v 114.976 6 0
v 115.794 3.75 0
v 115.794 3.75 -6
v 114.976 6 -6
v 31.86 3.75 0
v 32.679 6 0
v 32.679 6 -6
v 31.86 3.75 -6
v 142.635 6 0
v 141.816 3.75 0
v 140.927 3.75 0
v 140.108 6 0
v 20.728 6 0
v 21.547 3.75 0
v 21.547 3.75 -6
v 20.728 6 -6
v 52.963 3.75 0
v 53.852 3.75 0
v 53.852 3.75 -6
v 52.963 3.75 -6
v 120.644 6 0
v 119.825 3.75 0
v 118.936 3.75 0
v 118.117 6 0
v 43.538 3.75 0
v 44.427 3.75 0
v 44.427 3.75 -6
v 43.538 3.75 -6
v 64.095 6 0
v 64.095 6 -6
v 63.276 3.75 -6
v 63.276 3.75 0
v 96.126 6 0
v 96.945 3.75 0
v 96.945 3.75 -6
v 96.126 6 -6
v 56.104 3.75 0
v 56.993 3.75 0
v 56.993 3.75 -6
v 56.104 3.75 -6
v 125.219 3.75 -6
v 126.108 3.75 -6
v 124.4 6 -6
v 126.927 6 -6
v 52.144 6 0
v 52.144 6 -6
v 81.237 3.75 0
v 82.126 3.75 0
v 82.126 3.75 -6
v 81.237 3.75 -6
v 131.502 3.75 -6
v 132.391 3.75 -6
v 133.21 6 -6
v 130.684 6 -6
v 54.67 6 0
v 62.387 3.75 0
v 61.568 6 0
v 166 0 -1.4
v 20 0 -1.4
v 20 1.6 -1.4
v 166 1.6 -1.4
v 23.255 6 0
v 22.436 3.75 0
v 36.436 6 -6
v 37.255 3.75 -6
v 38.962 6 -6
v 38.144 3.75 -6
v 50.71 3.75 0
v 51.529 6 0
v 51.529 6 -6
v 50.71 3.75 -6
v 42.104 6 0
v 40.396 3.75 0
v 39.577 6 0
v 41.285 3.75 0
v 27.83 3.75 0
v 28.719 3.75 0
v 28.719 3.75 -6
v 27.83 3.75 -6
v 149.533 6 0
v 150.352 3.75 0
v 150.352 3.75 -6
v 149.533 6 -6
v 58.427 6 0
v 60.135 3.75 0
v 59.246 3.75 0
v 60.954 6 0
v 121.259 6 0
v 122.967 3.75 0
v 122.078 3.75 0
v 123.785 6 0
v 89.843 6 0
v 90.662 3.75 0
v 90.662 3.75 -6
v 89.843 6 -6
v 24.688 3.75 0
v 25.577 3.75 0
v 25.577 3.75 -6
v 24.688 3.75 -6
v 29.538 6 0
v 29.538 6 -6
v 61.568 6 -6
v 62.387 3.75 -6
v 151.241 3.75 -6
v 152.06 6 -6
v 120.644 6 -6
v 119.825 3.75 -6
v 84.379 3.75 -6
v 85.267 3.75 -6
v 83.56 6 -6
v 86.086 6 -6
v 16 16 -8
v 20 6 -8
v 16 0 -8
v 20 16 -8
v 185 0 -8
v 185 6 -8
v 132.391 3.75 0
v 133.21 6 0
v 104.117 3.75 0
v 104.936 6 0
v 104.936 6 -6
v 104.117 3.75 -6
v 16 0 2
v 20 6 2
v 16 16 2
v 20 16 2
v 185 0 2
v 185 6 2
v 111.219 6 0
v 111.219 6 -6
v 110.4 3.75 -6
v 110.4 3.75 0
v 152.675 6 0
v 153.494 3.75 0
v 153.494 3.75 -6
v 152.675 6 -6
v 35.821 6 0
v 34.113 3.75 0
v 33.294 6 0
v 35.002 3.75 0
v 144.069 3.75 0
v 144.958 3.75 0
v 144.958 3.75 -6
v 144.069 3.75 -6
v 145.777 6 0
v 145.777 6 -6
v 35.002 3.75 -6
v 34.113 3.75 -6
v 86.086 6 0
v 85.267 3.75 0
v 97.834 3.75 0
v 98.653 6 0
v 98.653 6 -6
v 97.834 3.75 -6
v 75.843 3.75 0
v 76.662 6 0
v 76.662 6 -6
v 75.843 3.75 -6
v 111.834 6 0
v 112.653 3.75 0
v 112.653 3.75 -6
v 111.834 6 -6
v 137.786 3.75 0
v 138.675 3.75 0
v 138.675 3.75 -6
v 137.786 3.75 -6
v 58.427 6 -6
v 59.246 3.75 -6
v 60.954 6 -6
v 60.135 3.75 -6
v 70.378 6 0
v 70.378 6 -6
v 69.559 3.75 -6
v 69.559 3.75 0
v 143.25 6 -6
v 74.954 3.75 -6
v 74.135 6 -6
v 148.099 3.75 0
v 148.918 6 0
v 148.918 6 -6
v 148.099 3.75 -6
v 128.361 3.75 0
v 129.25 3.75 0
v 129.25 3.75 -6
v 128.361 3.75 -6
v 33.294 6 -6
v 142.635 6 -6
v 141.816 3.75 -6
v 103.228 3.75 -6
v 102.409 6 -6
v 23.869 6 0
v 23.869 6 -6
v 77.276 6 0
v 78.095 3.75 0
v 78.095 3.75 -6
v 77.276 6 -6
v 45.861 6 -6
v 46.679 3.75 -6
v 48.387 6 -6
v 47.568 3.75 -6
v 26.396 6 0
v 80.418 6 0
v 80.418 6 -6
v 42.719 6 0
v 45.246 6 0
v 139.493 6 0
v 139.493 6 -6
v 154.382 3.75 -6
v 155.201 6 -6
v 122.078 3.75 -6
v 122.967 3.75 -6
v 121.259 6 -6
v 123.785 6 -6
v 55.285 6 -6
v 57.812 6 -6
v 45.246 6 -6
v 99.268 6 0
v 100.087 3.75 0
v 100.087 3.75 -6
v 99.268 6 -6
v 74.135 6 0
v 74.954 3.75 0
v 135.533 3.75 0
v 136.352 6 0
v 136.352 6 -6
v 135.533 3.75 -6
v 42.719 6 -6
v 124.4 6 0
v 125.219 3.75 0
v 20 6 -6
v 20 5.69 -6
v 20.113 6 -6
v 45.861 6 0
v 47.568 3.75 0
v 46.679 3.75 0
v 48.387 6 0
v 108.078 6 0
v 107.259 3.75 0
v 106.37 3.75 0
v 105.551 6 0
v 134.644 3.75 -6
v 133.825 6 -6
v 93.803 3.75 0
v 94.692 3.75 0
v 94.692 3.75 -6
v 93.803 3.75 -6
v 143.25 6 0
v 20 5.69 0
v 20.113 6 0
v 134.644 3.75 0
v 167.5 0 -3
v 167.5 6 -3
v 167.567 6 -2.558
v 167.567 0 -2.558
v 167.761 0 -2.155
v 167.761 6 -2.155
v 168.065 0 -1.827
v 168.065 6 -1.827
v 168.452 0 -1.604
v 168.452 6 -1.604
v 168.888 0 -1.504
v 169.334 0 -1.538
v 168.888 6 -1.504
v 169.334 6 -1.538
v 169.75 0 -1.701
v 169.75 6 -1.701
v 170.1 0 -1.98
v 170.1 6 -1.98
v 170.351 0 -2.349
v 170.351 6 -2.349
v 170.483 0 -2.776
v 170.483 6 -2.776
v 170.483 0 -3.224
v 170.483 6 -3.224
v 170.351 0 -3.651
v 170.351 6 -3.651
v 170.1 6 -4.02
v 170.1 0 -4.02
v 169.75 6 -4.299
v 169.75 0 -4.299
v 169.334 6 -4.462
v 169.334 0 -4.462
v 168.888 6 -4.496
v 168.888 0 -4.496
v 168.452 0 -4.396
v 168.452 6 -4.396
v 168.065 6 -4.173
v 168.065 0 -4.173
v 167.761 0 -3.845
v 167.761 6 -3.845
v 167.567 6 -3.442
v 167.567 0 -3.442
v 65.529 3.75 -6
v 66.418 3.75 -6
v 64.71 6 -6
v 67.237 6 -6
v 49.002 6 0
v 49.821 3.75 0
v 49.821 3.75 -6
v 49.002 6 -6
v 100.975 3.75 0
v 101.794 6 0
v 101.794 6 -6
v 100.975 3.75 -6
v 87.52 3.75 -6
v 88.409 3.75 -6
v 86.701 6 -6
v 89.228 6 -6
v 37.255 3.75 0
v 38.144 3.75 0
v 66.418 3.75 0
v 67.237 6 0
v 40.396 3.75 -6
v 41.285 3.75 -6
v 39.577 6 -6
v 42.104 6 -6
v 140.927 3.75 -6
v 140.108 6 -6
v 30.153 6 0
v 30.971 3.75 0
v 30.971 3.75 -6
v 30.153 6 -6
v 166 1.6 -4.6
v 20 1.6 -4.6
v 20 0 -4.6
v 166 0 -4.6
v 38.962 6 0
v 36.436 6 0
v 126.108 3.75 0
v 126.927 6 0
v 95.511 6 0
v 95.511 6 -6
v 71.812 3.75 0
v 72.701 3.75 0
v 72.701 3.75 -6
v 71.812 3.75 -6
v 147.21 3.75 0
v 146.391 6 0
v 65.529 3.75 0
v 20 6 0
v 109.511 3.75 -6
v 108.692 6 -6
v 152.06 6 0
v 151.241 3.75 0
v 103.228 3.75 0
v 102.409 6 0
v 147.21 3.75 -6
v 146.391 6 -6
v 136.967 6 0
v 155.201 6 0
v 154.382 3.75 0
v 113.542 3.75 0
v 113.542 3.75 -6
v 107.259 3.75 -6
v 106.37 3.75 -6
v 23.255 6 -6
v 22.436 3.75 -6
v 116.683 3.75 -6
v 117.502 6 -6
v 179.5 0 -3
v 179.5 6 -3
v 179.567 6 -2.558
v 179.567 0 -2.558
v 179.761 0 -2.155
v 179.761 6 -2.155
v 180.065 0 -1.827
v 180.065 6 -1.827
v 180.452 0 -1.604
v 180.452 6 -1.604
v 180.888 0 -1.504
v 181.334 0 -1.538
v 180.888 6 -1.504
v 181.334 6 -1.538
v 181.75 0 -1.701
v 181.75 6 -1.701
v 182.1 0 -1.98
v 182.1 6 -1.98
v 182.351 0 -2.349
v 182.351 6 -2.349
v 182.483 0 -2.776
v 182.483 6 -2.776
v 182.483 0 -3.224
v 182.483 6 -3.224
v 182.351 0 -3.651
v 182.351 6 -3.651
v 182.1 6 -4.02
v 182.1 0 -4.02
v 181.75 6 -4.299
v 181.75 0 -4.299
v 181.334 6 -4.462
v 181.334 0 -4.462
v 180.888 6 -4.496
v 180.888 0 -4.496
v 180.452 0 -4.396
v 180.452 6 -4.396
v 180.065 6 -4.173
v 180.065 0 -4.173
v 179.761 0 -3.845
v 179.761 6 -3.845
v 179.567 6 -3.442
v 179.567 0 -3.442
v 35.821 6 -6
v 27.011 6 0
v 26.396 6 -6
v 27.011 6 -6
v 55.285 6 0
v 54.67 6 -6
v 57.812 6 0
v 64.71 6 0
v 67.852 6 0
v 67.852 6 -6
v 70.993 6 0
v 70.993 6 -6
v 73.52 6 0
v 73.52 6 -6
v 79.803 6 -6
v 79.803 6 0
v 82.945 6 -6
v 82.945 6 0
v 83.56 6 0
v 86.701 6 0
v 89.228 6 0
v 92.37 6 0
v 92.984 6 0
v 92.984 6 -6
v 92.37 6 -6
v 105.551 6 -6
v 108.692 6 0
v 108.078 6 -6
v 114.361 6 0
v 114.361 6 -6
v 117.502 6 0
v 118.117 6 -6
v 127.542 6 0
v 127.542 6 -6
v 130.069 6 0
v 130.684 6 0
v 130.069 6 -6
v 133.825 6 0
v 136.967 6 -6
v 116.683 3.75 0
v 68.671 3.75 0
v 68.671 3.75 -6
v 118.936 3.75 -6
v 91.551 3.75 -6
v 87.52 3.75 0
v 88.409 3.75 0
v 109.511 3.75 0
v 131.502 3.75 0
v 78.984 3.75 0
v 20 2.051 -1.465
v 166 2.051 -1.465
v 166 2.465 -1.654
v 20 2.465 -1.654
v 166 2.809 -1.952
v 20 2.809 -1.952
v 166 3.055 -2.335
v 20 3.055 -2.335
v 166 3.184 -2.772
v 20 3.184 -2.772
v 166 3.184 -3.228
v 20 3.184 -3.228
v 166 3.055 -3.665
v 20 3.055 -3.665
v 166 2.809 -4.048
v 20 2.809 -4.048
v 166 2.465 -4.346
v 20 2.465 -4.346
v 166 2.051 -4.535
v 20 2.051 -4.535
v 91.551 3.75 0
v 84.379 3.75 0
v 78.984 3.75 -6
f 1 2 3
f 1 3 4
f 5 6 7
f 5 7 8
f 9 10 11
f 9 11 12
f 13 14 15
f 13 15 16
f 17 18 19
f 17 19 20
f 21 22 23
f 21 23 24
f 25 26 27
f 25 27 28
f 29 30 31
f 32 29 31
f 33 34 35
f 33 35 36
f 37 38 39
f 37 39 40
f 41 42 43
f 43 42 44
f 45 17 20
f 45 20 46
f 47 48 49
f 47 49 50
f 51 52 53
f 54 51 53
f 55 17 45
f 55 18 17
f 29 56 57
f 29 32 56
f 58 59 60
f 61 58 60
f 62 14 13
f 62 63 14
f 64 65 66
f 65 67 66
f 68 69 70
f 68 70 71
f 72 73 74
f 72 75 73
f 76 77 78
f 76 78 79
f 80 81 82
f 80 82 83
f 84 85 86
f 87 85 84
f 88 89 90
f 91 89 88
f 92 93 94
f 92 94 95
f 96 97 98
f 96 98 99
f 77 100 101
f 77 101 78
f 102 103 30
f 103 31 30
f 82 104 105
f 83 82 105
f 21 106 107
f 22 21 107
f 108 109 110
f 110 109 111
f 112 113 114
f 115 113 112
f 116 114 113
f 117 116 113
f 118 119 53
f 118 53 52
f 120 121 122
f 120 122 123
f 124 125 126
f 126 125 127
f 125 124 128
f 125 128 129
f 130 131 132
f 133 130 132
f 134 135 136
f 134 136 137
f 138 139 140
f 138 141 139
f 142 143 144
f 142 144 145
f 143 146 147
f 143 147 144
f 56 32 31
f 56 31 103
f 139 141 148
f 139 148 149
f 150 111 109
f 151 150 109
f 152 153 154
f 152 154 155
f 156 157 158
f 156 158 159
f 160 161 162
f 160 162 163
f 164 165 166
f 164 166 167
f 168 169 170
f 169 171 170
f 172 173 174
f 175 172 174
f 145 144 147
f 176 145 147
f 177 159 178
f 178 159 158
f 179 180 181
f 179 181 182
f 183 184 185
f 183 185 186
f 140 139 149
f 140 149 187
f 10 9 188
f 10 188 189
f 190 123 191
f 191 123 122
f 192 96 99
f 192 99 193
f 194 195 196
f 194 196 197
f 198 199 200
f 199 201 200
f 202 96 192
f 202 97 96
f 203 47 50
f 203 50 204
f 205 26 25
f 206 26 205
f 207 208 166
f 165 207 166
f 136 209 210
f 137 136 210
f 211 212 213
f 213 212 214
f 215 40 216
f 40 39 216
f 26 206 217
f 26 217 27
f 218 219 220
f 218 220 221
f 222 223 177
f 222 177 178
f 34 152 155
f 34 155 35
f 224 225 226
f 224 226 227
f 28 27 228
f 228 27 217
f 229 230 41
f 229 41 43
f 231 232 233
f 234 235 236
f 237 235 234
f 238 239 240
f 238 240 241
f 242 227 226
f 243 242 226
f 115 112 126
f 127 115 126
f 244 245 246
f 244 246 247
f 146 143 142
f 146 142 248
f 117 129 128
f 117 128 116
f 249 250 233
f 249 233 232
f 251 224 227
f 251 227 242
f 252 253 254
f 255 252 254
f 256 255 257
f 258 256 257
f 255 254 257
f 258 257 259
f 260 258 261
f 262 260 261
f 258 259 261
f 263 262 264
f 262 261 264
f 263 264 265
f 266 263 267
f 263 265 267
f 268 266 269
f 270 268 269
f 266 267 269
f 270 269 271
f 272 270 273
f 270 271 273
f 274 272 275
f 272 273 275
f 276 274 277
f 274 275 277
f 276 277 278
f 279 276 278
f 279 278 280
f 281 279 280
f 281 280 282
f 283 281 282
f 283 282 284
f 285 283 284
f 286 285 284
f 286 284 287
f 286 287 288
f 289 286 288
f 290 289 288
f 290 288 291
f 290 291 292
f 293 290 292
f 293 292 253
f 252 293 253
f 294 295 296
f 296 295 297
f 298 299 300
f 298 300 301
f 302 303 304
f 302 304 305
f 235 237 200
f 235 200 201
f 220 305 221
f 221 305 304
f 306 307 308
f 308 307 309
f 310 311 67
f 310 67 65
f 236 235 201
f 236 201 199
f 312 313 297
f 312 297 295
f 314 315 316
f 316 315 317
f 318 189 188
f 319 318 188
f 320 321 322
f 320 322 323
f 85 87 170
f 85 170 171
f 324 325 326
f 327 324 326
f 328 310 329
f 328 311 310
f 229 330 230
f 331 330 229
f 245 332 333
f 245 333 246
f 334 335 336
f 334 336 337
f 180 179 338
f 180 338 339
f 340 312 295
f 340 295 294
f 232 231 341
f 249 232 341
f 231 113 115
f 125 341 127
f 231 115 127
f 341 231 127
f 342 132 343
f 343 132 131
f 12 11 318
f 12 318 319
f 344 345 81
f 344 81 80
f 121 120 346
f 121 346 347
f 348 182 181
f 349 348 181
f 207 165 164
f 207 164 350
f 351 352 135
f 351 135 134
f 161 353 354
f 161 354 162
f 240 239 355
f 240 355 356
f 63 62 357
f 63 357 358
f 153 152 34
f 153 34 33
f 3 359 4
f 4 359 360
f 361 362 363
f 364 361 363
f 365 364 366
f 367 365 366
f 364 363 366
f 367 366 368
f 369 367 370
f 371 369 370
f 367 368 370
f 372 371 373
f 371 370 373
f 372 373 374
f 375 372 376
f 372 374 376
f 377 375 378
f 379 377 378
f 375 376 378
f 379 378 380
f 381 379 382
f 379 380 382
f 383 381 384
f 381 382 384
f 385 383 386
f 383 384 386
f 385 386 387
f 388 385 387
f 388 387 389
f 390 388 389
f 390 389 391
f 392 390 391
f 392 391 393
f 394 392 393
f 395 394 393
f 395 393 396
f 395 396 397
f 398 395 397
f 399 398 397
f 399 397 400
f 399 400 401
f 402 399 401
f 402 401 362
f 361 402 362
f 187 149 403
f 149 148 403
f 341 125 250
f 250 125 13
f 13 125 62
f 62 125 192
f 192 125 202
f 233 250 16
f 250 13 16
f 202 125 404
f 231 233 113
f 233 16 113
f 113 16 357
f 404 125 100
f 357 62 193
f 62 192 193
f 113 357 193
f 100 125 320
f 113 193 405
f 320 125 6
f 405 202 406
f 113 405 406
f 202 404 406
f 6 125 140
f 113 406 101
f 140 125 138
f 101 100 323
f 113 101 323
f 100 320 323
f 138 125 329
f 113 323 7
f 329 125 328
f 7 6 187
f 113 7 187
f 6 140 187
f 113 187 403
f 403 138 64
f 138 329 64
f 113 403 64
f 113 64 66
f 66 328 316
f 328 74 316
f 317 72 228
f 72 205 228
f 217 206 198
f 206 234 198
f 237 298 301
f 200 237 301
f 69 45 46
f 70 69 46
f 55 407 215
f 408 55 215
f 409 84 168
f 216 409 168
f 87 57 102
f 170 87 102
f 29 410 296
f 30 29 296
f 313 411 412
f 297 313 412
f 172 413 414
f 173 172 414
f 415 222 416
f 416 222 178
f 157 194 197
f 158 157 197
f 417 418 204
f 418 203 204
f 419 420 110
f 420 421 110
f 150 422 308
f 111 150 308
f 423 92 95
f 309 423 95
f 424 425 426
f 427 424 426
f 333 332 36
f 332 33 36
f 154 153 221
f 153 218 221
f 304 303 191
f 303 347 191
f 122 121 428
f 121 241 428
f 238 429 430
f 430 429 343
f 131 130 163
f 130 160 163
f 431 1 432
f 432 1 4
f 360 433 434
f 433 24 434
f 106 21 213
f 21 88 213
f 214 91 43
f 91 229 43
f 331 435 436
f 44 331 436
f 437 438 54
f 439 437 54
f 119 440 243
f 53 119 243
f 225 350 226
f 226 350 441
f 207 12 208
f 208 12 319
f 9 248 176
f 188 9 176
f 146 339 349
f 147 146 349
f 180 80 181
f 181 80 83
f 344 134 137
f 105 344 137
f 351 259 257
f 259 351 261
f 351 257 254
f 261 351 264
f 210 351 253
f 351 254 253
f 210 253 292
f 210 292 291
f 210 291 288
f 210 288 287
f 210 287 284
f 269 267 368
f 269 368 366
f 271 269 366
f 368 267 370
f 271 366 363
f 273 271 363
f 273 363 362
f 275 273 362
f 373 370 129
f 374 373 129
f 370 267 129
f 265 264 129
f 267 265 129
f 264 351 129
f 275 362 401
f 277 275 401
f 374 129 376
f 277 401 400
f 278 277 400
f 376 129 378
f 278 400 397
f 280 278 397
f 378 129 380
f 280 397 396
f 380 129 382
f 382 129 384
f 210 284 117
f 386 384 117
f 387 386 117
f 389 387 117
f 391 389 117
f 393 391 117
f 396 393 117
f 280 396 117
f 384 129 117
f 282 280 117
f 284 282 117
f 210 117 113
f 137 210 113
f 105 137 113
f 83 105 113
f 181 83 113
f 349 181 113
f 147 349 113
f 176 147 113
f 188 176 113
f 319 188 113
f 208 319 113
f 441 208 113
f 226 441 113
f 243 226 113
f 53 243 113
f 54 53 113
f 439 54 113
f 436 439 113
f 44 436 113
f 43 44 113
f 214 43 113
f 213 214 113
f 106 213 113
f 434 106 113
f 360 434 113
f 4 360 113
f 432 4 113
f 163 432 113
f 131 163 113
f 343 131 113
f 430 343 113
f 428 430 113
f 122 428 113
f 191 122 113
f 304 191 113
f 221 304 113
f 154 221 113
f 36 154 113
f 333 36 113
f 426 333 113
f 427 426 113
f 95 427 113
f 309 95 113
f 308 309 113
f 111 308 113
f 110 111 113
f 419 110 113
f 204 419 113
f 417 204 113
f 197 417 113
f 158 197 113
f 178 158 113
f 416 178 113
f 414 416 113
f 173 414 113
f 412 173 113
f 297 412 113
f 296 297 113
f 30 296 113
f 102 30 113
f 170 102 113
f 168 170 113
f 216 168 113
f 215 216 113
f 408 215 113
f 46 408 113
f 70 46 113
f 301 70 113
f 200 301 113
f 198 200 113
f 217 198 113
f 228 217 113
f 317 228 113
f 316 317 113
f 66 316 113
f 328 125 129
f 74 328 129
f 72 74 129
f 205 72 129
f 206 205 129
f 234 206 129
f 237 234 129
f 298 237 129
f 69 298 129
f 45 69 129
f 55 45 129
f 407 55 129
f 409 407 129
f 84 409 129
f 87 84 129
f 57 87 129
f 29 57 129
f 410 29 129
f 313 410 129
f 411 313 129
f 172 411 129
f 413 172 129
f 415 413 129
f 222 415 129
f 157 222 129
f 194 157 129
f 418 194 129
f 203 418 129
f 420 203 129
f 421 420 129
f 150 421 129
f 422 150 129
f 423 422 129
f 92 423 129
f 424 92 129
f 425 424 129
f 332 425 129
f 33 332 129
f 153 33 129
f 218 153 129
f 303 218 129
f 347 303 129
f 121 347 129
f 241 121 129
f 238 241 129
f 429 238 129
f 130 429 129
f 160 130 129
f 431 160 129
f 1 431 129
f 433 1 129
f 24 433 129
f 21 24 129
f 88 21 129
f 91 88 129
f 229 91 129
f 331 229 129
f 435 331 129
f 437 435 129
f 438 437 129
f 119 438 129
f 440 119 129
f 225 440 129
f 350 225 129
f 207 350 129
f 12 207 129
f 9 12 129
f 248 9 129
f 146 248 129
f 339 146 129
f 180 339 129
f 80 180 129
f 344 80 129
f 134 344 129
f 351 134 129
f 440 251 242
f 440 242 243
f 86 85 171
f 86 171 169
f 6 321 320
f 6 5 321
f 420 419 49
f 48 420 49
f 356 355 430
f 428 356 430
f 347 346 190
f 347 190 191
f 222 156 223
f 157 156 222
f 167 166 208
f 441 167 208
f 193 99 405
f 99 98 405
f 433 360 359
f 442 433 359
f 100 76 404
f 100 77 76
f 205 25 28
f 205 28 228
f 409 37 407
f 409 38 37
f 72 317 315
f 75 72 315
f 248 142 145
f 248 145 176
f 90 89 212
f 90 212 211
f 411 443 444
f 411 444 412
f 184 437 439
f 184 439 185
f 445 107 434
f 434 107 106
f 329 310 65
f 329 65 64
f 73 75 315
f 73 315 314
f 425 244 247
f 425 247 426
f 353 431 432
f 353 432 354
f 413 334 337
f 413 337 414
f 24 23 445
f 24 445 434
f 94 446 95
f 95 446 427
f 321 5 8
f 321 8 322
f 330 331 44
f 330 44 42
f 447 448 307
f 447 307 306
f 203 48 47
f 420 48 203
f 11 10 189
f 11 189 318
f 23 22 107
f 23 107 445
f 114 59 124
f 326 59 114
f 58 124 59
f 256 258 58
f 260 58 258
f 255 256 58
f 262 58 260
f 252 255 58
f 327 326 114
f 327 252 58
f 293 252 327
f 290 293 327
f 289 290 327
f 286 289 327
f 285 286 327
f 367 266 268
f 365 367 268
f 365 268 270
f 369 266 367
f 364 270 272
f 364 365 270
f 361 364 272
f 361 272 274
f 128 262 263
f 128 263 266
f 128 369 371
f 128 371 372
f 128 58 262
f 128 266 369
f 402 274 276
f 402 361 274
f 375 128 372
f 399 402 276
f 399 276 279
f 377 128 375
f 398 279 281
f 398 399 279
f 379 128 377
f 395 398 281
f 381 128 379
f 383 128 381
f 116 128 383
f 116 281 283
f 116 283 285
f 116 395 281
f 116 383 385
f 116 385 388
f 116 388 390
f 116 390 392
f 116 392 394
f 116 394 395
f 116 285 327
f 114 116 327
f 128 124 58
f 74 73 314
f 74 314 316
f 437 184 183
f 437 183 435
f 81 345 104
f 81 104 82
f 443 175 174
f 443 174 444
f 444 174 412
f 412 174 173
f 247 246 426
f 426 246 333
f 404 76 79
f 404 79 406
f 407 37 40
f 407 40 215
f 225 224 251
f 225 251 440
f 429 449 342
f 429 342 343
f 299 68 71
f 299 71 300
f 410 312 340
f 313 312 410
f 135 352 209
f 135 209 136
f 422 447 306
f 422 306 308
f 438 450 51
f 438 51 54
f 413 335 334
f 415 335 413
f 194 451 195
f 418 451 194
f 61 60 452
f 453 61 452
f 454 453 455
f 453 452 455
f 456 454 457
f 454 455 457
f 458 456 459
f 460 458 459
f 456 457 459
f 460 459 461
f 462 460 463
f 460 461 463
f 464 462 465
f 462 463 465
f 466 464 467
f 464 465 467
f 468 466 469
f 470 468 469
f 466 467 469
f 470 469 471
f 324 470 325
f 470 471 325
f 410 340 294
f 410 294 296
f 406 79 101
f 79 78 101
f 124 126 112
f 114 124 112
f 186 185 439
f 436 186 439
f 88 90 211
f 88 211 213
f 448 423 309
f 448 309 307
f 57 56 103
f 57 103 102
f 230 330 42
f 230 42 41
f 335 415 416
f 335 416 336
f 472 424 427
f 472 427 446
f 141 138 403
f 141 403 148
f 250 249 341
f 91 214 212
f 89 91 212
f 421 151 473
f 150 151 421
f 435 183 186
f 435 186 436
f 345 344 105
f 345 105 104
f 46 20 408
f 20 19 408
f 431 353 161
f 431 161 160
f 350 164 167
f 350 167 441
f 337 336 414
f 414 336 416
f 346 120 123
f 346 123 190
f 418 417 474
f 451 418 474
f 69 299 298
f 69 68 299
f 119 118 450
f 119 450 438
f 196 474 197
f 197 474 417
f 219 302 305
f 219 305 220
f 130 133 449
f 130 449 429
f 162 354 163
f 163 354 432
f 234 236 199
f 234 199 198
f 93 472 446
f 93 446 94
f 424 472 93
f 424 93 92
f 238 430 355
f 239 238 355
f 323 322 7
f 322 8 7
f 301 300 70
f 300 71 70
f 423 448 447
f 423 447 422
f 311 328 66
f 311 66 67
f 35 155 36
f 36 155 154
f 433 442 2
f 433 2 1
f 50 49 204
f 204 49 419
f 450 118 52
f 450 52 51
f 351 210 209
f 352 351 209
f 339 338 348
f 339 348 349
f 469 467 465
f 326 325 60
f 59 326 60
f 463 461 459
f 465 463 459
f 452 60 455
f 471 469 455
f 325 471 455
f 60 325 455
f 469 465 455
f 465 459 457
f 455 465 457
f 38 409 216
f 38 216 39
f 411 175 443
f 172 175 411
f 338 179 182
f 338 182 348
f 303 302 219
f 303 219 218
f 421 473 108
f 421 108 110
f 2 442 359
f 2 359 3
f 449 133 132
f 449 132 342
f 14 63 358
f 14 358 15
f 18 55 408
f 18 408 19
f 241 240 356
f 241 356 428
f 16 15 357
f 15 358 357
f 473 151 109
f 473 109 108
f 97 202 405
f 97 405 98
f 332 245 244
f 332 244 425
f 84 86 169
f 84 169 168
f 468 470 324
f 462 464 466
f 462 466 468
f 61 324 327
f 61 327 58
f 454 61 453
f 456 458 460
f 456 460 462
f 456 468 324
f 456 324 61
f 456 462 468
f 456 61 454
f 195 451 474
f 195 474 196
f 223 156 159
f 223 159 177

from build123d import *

# Parameters (mm, degrees)
BLANKSKE_W             = 185
BLANKSKE_H             = 6
BLANK_DEPTH            = 6
TOOTHCUTILL_DEPTH      = 186.194492359
TOOTHCUTSIM_DEPTH      = 186.194492359
PATTERN_LINEAR_1_COUNT = 50
PATTERN_LINEAR_1_PITCH = 3.14159265
SKETCH_3_W             = 6
SKETCH_3_H             = 6
CUT_EXTRUDE_1_DEPTH    = 16
SKETCH_2_W             = 2
SKETCH_2_H             = 6
EXTRUDE_2_DEPTH        = 169
CUT_EXTRUDE_2_DEPTH    = 150
SKETCH_5_W             = 10
SKETCH_5_H             = 16
EXTRUDE_3_DEPTH        = 4
SKETCH_6_R             = 1.5
CUT_EXTRUDE_3_DEPTH    = 186.442713526


with BuildPart() as part:
    # BlankSke → Blank (new body)
    with BuildSketch(Plane.XY):
        with Locations((92.5, 3)):
            Rectangle(BLANKSKE_W, BLANKSKE_H)
    extrude(amount=-BLANK_DEPTH)

    # TooCutSkeIll → ToothCutIll (cut, through all)
    with BuildSketch(Plane.XY):
        with BuildLine():
            Line((-1.253788993, 5.973680806), (-0.504546125, 3.915152944))
            ThreePointArc((-0.504546125, 3.915152944), (-0.412650963, 3.795392837), (-0.268683278, 3.75))
            Line((-0.268683278, 3.75), (0.268683278, 3.75))
            ThreePointArc((0.268683278, 3.75), (0.412650963, 3.795392837), (0.504546125, 3.915152944))
            Line((0.504546125, 3.915152944), (1.253788993, 5.973680806))
            ThreePointArc((1.253788993, 5.973680806), (1.268433641, 5.992766082), (1.291376698, 6))
            Line((1.291376698, 6), (1.291376698, 6.0254))
            Line((1.291376698, 6.0254), (-1.291376698, 6.0254))
            Line((-1.291376698, 6.0254), (-1.291376698, 6))
            ThreePointArc((-1.291376698, 6), (-1.268433641, 5.992766082), (-1.253788993, 5.973680806))
        make_face()
    extrude(amount=-TOOTHCUTILL_DEPTH, mode=Mode.SUBTRACT)

    # TooCutSkeSim → ToothCutSim (cut, through all)
    with BuildSketch(Plane.XY):
        Polygon((0.44443537, 3.75), (-0.44443537, 3.75), (-1.272613241, 6.0254), (1.272613241, 6.0254), align=None)
    toothcutsim = extrude(amount=-TOOTHCUTSIM_DEPTH, mode=Mode.SUBTRACT)

    # Линейный массив1: ToothCutSim ×50
    with Locations(*[(i * PATTERN_LINEAR_1_PITCH, 0, 0) for i in range(1, PATTERN_LINEAR_1_COUNT)]):
        add(toothcutsim, mode=Mode.SUBTRACT)

    # Эскиз3 → Вырез-Вытянуть1 (cut)
    with BuildSketch(Plane.ZY):
        with Locations((-3, 3)):
            Rectangle(SKETCH_3_W, SKETCH_3_H)
    extrude(amount=-CUT_EXTRUDE_1_DEPTH, mode=Mode.SUBTRACT)

    # Эскиз2 → Бобышка-Вытянуть2 (add)
    with BuildSketch(Plane(origin=(185, 0, 0), x_dir=(0, 0, -1), z_dir=(1, 0, 0))):
        with Locations((7, 3)):
            Rectangle(SKETCH_2_W, SKETCH_2_H)
        with Locations((-1, 3)):
            Rectangle(SKETCH_2_W, SKETCH_2_H)
    extrude(amount=-EXTRUDE_2_DEPTH)

    # Эскиз4 → Вырез-Вытянуть2 (cut)
    with BuildSketch(Plane.ZY.offset(-16)):
        with BuildLine():
            Line((-4.6, 1.6), (-4.6, 0))
            Line((-4.6, 0), (-1.4, 0))
            Line((-1.4, 0), (-1.4, 1.6))
            ThreePointArc((-1.4, 1.6), (-3, 3.2), (-4.6, 1.6))
        make_face()
    extrude(amount=-CUT_EXTRUDE_2_DEPTH, mode=Mode.SUBTRACT)

    # Эскиз5 → Бобышка-Вытянуть3 (add)
    with BuildSketch(Plane.ZY.offset(-16)):
        with Locations((-3, 8)):
            Rectangle(SKETCH_5_W, SKETCH_5_H)
    extrude(amount=-EXTRUDE_3_DEPTH)

    # Эскиз6 → Вырез-Вытянуть3 (cut, through all)
    with BuildSketch(Plane(origin=(0, 6, 0), x_dir=(1, 0, 0), z_dir=(0, 1, 0))):
        with Locations(Location((181, 3, 0), (0, 0, 180))):
            Circle(SKETCH_6_R)
        with Locations(Location((169, 3, 0), (0, 0, 180))):
            Circle(SKETCH_6_R)
    extrude(amount=-CUT_EXTRUDE_3_DEPTH, mode=Mode.SUBTRACT)


solid = part.part
